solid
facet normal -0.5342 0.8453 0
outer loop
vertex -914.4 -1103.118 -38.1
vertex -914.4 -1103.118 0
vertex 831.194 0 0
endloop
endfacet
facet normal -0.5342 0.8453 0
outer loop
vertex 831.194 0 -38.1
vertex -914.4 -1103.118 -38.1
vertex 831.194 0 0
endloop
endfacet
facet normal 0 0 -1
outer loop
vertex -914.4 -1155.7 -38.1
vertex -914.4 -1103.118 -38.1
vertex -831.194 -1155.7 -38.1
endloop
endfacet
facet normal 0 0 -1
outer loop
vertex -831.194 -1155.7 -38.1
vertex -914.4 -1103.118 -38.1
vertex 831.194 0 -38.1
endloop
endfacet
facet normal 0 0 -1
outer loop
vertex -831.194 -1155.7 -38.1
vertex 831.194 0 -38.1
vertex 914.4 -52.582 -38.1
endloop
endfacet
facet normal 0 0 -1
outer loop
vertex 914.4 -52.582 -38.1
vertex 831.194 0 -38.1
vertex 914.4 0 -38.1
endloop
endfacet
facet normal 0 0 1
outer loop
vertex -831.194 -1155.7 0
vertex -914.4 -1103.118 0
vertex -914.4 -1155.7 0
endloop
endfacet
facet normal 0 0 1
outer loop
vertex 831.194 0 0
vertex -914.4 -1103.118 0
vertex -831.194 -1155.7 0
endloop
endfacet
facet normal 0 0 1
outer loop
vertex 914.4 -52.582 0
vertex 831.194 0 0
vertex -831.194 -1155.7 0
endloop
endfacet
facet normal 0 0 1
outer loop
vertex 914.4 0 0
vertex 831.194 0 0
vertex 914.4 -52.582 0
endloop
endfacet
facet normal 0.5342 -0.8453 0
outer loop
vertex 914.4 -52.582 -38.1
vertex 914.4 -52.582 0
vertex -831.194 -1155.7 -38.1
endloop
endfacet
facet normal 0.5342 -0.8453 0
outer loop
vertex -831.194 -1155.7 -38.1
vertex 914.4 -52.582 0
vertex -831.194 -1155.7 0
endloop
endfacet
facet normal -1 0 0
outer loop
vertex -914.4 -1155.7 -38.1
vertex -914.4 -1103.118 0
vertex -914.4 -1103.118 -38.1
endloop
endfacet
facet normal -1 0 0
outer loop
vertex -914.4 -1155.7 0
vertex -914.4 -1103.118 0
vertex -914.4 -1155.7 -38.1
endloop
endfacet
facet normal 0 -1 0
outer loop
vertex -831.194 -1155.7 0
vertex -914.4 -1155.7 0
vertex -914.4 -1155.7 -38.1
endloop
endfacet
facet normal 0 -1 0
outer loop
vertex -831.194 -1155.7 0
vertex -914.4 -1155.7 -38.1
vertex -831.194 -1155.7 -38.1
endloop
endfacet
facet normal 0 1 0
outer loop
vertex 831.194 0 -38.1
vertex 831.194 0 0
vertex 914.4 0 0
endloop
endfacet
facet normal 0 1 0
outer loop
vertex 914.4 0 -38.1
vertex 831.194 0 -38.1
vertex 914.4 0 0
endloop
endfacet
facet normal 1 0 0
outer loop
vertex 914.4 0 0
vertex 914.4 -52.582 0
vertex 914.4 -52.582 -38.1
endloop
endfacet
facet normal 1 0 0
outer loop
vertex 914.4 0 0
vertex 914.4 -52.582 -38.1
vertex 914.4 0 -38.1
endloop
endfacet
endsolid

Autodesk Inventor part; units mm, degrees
ref_plane "YZ Plane" through (0, 0, 0) normal (1, 0, 0) x (0, 1, 0)
ref_plane "XZ Plane" through (0, 0, 0) normal (0, 1, 0) x (-1, 0, 0)
ref_plane "XY Plane" through (0, 0, 0) normal (0, 0, 1) x (1, 0, 0)
sketch "Sketch1" plane through (0, 0, 0) normal (0, 0, 1) x (1, 0, 0)
  line L0 (-914.4, 0) -> (914.4, 0) projected
  line L1 (-914.4, 2482.85) -> (-914.4, -2393.95) projected
  line L2 (914.4, -2393.95) -> (914.4, 2482.85) projected
  line L3 (-914.4, -1155.7) -> (914.4, -1155.7) projected
  line L4 (914.4, -52.5818) -> (-831.1936, -1155.7)
  line L5 (-914.4, -1103.1182) -> (831.1936, 0)
  line L6 (914.4, -52.5818) -> (914.4, 0)
  line L7 (914.4, 0) -> (831.1936, 0)
  line L8 (-914.4, -1103.1182) -> (-914.4, -1155.7)
  line L9 (-831.1936, -1155.7) -> (-914.4, -1155.7)
  point P0 (0, 0)
extrude "Extrusion1" add sketch "Sketch1" against normal blind 38.1 contours L0 L2 L4 L3 L1 L5
properties part number "side2"
